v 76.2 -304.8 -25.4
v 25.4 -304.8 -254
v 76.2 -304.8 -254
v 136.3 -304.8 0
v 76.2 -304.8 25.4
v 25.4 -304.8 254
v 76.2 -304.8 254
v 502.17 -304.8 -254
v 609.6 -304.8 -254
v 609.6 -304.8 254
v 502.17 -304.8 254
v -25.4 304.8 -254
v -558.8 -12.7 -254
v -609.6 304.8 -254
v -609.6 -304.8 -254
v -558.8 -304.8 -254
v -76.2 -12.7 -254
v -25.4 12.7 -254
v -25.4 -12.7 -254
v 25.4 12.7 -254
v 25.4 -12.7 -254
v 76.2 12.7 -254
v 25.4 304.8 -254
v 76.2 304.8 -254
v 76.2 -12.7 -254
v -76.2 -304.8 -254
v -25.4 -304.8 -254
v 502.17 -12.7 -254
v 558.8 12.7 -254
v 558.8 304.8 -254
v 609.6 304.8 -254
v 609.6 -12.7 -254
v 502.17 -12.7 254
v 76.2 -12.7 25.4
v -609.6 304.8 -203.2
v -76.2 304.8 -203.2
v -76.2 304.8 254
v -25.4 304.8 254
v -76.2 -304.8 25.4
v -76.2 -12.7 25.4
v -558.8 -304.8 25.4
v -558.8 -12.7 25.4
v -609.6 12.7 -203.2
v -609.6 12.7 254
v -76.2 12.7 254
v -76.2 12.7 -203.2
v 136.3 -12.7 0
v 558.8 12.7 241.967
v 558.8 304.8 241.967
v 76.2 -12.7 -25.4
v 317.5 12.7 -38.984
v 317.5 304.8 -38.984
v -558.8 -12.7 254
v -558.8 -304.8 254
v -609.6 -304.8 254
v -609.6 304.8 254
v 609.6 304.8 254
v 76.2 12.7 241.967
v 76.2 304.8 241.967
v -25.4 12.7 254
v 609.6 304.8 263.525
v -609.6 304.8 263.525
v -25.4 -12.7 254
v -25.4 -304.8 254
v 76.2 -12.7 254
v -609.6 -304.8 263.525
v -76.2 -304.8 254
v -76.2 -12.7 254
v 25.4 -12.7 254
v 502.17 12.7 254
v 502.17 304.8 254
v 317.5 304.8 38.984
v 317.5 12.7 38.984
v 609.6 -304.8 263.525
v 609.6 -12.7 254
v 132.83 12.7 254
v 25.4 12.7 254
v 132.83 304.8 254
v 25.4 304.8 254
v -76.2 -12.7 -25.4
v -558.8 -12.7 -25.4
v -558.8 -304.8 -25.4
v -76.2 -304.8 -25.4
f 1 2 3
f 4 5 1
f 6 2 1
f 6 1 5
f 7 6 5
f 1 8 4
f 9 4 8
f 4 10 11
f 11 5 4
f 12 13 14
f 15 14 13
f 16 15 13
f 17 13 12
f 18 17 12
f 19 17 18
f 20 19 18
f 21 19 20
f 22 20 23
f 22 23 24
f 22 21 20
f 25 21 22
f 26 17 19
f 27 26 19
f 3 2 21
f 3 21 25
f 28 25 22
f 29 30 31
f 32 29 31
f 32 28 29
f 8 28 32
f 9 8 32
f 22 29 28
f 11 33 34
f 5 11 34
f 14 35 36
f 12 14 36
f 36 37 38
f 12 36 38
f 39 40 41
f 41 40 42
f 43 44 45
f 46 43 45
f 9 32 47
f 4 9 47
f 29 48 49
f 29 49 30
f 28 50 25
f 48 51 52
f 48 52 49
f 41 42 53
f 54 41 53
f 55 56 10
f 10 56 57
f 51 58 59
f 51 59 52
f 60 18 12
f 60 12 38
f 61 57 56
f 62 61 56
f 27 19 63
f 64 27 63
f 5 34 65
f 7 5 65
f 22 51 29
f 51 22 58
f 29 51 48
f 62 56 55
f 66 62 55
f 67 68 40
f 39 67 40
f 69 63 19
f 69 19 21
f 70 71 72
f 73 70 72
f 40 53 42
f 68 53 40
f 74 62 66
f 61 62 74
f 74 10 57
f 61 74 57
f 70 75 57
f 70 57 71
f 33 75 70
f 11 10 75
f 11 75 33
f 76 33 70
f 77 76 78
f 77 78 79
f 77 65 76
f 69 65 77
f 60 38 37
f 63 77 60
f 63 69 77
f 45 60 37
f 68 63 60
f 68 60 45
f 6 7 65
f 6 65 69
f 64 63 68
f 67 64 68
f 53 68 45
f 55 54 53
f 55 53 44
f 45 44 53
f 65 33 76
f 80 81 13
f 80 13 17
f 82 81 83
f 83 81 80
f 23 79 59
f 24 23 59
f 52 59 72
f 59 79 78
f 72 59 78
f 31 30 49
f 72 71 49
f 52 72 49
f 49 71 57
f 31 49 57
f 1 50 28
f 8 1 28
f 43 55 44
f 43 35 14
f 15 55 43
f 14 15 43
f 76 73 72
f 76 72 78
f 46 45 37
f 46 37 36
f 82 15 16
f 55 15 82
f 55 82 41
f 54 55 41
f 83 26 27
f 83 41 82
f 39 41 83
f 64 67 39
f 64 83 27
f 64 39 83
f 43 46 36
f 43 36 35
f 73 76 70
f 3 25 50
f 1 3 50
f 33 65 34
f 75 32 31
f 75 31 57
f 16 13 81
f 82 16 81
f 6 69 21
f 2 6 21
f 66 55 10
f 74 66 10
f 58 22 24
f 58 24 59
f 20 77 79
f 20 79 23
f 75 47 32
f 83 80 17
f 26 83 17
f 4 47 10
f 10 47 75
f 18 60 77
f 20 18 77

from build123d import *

# Parameters (mm, degrees)
F0_W     = 482.6
F0_H     = 228.6
F0_W_2   = 50.8
F0_H_2   = 508
F1_DEPTH = 12.7
F2_DEPTH = 304.8
F4_DEPTH = 304.8
F5_W     = 369.3403837607
F5_H     = 292.1
F5_W_2   = 50.8
F5_W_3   = 425.9701918804
F5_W_4   = 533.4
F5_W_5   = 482.6
F6_DEPTH = 9.525


# Not quite as in the source:
# - a length typed as a fraction of an inch, garbled in the dataset ("3 / 203.2 mm" for 3/8 in), is restored


with BuildPart() as f1:
    # F0 (on Front) → F1 (new body, symmetric)
    with BuildSketch(Plane.XZ):
        with Locations((-317.5, 139.7)):
            Rectangle(F0_W, F0_H)
        with Locations((-317.5, -139.7)):
            Rectangle(F0_W, F0_H)
        Polygon((-558.8, 254), (-609.6, 254), (-609.6, -254), (-558.8, -254), (-558.8, -25.4), (-76.2, -25.4), (-76.2, -254), (-25.4, -254), (-25.4, 254), (-76.2, 254), (-76.2, 25.4), (-558.8, 25.4), align=None)
        Rectangle(F0_W_2, F0_H_2)
        Polygon((76.2, 254), (25.4, 254), (25.4, -254), (76.2, -254), (76.2, -25.4), (502.1701918804, -254), (609.6, -254), (136.2997867996, 0), (609.6, 254), (502.1701918804, 254), (76.2, 25.4), align=None)
        Polygon((76.2, -25.4), (76.2, -254), (502.1701918804, -254), align=None)
        Polygon((609.6, -254), (609.6, 254), (136.2997867996, 0), align=None)
        Polygon((502.1701918804, 254), (76.2, 254), (76.2, 25.4), align=None)
    extrude(amount=F1_DEPTH, both=True)

    # F0 (on Front) → F2 (join)
    with BuildSketch(Plane.XZ):
        Polygon((-558.8, 254), (-609.6, 254), (-609.6, -254), (-558.8, -254), (-558.8, -25.4), (-76.2, -25.4), (-76.2, -254), (-25.4, -254), (-25.4, 254), (-76.2, 254), (-76.2, 25.4), (-558.8, 25.4), align=None)
        Polygon((76.2, 254), (25.4, 254), (25.4, -254), (76.2, -254), (76.2, -25.4), (502.1701918804, -254), (609.6, -254), (136.2997867996, 0), (609.6, 254), (502.1701918804, 254), (76.2, 25.4), align=None)
    extrude(amount=F2_DEPTH)

    # F3 (on Front) → F4 (join)
    with BuildSketch(Plane.XZ):
        Polygon((132.8298081196, 254), (25.4, 254), (25.4, -254), (76.2, -254), (76.2, 241.9669375636), (317.5, -38.9842283051), (558.8, 241.9669375636), (558.8, -254), (609.6, -254), (609.6, 254), (502.1701918804, 254), (317.5, 38.9842283051), align=None)
        Polygon((-25.4, -254), (-25.4, 254), (-76.2, 254), (-76.2, -203.2), (-609.6, -203.2), (-609.6, -254), align=None)
    extrude(amount=-F4_DEPTH)


with BuildPart() as f6:
    # F5 (on face) → F6 (new body)
    with BuildSketch(Plane.XY.offset(254)):
        Polygon((609.6, -12.7), (609.6, 304.8), (502.1701918804, 304.8), (502.1701918804, 12.7), (132.8298081196, 12.7), (132.8298081196, 304.8), (25.4, 304.8), (25.4, 12.7), (-25.4, 12.7), (-25.4, 304.8), (-76.2, 304.8), (-76.2, 12.7), (-609.6, 12.7), (-609.6, -304.8), (-558.8, -304.8), (-558.8, -12.7), (-76.2, -12.7), (-76.2, -304.8), (-25.4, -304.8), (-25.4, -12.7), (25.4, -12.7), (25.4, -304.8), (76.2, -304.8), (76.2, -12.7), (502.1701918804, -12.7), (502.1701918804, -304.8), (609.6, -304.8), align=None)
        with Locations((317.5, 158.75)):
            Rectangle(F5_W, F5_H)
        with Locations((0, 158.75)):
            Rectangle(F5_W_2, F5_H)
        with Locations((289.1850959402, -158.75)):
            Rectangle(F5_W_3, F5_H)
        with Locations((-342.9, 158.75)):
            Rectangle(F5_W_4, F5_H)
        with Locations((0, -158.75)):
            Rectangle(F5_W_2, F5_H)
        with Locations((-317.5, -158.75)):
            Rectangle(F5_W_5, F5_H)
    extrude(amount=F6_DEPTH)


solid = Compound([f1.part, f6.part])
